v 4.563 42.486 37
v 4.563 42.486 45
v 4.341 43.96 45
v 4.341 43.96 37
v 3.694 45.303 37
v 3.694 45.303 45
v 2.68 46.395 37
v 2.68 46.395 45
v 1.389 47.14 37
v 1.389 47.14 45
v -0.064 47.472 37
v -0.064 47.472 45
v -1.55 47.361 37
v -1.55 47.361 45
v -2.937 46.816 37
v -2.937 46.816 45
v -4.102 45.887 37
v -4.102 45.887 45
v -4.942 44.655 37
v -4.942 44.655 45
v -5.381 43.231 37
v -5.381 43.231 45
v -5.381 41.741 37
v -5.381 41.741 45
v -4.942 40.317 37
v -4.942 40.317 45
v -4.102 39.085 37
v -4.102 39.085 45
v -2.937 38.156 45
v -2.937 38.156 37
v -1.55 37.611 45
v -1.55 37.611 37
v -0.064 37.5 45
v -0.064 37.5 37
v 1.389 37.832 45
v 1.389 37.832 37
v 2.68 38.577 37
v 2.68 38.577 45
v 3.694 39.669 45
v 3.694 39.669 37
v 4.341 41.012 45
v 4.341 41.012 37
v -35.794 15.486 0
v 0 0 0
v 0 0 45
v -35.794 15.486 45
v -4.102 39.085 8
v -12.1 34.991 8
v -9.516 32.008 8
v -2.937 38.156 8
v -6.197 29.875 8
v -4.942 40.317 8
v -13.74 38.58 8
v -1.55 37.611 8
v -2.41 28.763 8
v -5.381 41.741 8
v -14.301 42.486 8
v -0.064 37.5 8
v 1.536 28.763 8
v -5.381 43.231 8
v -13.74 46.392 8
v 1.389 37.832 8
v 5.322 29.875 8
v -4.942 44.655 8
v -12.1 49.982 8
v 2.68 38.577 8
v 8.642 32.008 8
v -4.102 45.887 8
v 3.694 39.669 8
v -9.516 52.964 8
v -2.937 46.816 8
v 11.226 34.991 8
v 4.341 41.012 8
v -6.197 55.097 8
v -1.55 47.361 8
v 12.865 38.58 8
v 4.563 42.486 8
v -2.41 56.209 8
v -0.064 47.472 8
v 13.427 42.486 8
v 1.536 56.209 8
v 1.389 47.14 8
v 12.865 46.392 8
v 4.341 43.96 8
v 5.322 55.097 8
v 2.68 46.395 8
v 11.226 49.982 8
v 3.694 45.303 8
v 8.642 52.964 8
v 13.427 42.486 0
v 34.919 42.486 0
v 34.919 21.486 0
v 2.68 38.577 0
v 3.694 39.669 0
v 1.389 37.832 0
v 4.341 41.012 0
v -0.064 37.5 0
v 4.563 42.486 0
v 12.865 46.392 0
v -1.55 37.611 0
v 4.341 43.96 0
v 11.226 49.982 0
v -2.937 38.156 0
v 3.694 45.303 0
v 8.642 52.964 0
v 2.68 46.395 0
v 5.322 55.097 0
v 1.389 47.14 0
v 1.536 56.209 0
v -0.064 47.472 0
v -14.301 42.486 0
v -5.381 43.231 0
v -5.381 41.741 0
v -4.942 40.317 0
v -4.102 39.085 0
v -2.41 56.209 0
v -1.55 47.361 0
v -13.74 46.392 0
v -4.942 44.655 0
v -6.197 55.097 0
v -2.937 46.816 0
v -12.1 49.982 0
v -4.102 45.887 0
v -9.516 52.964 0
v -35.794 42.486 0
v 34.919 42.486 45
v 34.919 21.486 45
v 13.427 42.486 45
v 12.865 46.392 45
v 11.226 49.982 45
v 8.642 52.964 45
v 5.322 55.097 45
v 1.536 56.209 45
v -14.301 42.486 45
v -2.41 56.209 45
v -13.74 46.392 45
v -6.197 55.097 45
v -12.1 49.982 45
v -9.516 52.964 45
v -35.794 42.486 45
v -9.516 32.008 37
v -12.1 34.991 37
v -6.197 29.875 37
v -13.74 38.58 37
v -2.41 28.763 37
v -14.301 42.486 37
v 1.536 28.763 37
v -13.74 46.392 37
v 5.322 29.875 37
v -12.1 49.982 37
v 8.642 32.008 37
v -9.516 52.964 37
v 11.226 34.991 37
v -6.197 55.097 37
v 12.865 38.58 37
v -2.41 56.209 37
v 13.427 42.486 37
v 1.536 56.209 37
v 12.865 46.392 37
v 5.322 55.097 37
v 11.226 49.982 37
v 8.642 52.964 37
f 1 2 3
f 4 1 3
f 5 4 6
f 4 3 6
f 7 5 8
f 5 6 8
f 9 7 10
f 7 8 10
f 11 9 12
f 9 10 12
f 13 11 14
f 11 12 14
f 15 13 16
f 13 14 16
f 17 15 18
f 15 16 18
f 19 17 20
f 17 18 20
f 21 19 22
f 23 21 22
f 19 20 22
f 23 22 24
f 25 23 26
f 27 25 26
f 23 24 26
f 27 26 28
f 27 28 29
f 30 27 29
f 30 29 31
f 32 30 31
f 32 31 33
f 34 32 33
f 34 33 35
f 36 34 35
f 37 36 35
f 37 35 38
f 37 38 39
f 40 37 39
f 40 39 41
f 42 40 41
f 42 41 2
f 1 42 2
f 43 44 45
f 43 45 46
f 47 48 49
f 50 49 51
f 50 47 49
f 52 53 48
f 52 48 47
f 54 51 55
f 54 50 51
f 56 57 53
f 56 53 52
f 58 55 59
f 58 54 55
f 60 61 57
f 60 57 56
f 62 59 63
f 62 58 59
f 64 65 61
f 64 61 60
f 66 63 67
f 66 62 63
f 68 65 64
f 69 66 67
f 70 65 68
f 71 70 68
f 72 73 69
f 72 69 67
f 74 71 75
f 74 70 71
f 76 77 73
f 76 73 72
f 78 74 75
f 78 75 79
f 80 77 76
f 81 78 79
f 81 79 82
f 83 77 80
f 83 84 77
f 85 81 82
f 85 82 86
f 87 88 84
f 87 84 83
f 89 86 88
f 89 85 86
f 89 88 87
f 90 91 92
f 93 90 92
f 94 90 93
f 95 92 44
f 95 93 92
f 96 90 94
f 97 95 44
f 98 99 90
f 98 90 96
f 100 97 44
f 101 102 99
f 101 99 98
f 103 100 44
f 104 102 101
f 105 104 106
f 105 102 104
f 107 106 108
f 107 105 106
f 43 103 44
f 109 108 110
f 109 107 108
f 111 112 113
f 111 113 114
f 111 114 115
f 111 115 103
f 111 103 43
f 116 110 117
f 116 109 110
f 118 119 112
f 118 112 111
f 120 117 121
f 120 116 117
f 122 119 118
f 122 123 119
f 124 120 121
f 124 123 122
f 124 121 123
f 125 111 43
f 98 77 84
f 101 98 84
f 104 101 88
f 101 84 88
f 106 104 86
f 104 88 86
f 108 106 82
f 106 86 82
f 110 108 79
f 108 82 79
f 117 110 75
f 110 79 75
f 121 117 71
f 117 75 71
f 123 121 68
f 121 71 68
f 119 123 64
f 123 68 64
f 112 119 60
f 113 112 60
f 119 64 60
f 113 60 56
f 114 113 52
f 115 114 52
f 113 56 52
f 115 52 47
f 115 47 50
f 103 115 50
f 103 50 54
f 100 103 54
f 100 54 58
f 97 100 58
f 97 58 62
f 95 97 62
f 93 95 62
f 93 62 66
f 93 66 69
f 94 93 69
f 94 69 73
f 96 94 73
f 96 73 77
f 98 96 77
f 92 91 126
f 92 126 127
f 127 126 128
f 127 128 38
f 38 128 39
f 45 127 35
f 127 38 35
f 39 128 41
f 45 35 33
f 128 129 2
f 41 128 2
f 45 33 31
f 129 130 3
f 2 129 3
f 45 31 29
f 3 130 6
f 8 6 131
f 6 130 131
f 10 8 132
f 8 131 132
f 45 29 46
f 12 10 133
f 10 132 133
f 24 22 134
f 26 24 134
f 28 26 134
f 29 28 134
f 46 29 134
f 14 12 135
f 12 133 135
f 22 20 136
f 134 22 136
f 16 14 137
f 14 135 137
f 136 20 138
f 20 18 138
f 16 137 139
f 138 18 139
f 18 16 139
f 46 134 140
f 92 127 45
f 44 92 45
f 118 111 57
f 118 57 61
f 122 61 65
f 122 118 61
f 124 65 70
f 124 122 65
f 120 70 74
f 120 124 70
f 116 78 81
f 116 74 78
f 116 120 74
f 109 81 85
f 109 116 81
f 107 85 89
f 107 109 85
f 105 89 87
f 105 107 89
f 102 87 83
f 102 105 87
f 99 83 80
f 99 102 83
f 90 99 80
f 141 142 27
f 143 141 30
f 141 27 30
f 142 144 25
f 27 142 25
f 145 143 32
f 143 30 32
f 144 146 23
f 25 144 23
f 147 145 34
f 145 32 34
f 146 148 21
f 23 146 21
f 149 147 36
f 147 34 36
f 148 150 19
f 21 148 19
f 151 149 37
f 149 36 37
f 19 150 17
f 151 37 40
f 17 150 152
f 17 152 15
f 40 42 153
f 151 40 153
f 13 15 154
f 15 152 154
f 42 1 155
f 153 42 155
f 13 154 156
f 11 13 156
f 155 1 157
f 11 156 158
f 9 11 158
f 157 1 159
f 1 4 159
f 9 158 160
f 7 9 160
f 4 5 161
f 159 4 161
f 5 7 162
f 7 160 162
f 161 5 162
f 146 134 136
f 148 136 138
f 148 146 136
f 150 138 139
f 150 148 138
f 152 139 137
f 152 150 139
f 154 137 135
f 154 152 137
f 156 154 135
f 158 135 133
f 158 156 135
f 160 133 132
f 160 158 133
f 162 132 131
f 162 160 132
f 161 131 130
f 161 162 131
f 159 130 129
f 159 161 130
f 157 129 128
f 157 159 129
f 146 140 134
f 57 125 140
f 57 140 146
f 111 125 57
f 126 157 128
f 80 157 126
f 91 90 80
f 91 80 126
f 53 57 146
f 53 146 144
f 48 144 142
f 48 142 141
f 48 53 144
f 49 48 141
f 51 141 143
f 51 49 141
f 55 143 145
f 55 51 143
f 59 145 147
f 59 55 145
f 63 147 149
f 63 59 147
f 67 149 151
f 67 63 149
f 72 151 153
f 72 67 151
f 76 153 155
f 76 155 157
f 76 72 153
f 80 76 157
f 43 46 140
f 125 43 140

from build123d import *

# Parameters (mm, degrees)
BOSS_EXTRUDE1_DEPTH = 45
CUT_EXTRUDE1_START  = -37
SKETCH3_R           = 13.864092281
CUT_EXTRUDE1_DEPTH  = 29
SKETCH4_R           = 5
CUT_EXTRUDE2_DEPTH  = 81.507898783


with BuildPart() as part:
    # Sketch1 → Boss-Extrude1 (new body)
    with BuildSketch(Plane.XY):
        with BuildLine():
            Line((0, 0), (-35.793601182, 15.486061941))
            Line((-35.793601182, 15.486061941), (-35.793601182, 42.486061941))
            Line((-35.793601182, 42.486061941), (-14.301302797, 42.486061941))
            ThreePointArc((-14.301302797, 42.486061941), (-0.437210516, 56.350154222), (13.426881764, 42.486061941))
            Line((13.426881764, 42.486061941), (34.919180149, 42.486061941))
            Line((34.919180149, 42.486061941), (34.919180149, 21.486061941))
            Line((34.919180149, 21.486061941), (0, 0))
        make_face()
    extrude(amount=BOSS_EXTRUDE1_DEPTH)

    # Sketch3 → Cut-Extrude1 (cut)
    with BuildSketch(Plane.XY.offset(45).offset(CUT_EXTRUDE1_START)):
        with Locations((-0.437210516, 42.486061941)):
            Circle(SKETCH3_R)
    extrude(amount=CUT_EXTRUDE1_DEPTH, mode=Mode.SUBTRACT)

    # Sketch4 → Cut-Extrude2 (cut, through all)
    with BuildSketch(Plane.XY.offset(45)):
        with Locations((-0.437210516, 42.486061941)):
            Circle(SKETCH4_R)
    extrude(amount=-CUT_EXTRUDE2_DEPTH, mode=Mode.SUBTRACT)


solid = part.part
